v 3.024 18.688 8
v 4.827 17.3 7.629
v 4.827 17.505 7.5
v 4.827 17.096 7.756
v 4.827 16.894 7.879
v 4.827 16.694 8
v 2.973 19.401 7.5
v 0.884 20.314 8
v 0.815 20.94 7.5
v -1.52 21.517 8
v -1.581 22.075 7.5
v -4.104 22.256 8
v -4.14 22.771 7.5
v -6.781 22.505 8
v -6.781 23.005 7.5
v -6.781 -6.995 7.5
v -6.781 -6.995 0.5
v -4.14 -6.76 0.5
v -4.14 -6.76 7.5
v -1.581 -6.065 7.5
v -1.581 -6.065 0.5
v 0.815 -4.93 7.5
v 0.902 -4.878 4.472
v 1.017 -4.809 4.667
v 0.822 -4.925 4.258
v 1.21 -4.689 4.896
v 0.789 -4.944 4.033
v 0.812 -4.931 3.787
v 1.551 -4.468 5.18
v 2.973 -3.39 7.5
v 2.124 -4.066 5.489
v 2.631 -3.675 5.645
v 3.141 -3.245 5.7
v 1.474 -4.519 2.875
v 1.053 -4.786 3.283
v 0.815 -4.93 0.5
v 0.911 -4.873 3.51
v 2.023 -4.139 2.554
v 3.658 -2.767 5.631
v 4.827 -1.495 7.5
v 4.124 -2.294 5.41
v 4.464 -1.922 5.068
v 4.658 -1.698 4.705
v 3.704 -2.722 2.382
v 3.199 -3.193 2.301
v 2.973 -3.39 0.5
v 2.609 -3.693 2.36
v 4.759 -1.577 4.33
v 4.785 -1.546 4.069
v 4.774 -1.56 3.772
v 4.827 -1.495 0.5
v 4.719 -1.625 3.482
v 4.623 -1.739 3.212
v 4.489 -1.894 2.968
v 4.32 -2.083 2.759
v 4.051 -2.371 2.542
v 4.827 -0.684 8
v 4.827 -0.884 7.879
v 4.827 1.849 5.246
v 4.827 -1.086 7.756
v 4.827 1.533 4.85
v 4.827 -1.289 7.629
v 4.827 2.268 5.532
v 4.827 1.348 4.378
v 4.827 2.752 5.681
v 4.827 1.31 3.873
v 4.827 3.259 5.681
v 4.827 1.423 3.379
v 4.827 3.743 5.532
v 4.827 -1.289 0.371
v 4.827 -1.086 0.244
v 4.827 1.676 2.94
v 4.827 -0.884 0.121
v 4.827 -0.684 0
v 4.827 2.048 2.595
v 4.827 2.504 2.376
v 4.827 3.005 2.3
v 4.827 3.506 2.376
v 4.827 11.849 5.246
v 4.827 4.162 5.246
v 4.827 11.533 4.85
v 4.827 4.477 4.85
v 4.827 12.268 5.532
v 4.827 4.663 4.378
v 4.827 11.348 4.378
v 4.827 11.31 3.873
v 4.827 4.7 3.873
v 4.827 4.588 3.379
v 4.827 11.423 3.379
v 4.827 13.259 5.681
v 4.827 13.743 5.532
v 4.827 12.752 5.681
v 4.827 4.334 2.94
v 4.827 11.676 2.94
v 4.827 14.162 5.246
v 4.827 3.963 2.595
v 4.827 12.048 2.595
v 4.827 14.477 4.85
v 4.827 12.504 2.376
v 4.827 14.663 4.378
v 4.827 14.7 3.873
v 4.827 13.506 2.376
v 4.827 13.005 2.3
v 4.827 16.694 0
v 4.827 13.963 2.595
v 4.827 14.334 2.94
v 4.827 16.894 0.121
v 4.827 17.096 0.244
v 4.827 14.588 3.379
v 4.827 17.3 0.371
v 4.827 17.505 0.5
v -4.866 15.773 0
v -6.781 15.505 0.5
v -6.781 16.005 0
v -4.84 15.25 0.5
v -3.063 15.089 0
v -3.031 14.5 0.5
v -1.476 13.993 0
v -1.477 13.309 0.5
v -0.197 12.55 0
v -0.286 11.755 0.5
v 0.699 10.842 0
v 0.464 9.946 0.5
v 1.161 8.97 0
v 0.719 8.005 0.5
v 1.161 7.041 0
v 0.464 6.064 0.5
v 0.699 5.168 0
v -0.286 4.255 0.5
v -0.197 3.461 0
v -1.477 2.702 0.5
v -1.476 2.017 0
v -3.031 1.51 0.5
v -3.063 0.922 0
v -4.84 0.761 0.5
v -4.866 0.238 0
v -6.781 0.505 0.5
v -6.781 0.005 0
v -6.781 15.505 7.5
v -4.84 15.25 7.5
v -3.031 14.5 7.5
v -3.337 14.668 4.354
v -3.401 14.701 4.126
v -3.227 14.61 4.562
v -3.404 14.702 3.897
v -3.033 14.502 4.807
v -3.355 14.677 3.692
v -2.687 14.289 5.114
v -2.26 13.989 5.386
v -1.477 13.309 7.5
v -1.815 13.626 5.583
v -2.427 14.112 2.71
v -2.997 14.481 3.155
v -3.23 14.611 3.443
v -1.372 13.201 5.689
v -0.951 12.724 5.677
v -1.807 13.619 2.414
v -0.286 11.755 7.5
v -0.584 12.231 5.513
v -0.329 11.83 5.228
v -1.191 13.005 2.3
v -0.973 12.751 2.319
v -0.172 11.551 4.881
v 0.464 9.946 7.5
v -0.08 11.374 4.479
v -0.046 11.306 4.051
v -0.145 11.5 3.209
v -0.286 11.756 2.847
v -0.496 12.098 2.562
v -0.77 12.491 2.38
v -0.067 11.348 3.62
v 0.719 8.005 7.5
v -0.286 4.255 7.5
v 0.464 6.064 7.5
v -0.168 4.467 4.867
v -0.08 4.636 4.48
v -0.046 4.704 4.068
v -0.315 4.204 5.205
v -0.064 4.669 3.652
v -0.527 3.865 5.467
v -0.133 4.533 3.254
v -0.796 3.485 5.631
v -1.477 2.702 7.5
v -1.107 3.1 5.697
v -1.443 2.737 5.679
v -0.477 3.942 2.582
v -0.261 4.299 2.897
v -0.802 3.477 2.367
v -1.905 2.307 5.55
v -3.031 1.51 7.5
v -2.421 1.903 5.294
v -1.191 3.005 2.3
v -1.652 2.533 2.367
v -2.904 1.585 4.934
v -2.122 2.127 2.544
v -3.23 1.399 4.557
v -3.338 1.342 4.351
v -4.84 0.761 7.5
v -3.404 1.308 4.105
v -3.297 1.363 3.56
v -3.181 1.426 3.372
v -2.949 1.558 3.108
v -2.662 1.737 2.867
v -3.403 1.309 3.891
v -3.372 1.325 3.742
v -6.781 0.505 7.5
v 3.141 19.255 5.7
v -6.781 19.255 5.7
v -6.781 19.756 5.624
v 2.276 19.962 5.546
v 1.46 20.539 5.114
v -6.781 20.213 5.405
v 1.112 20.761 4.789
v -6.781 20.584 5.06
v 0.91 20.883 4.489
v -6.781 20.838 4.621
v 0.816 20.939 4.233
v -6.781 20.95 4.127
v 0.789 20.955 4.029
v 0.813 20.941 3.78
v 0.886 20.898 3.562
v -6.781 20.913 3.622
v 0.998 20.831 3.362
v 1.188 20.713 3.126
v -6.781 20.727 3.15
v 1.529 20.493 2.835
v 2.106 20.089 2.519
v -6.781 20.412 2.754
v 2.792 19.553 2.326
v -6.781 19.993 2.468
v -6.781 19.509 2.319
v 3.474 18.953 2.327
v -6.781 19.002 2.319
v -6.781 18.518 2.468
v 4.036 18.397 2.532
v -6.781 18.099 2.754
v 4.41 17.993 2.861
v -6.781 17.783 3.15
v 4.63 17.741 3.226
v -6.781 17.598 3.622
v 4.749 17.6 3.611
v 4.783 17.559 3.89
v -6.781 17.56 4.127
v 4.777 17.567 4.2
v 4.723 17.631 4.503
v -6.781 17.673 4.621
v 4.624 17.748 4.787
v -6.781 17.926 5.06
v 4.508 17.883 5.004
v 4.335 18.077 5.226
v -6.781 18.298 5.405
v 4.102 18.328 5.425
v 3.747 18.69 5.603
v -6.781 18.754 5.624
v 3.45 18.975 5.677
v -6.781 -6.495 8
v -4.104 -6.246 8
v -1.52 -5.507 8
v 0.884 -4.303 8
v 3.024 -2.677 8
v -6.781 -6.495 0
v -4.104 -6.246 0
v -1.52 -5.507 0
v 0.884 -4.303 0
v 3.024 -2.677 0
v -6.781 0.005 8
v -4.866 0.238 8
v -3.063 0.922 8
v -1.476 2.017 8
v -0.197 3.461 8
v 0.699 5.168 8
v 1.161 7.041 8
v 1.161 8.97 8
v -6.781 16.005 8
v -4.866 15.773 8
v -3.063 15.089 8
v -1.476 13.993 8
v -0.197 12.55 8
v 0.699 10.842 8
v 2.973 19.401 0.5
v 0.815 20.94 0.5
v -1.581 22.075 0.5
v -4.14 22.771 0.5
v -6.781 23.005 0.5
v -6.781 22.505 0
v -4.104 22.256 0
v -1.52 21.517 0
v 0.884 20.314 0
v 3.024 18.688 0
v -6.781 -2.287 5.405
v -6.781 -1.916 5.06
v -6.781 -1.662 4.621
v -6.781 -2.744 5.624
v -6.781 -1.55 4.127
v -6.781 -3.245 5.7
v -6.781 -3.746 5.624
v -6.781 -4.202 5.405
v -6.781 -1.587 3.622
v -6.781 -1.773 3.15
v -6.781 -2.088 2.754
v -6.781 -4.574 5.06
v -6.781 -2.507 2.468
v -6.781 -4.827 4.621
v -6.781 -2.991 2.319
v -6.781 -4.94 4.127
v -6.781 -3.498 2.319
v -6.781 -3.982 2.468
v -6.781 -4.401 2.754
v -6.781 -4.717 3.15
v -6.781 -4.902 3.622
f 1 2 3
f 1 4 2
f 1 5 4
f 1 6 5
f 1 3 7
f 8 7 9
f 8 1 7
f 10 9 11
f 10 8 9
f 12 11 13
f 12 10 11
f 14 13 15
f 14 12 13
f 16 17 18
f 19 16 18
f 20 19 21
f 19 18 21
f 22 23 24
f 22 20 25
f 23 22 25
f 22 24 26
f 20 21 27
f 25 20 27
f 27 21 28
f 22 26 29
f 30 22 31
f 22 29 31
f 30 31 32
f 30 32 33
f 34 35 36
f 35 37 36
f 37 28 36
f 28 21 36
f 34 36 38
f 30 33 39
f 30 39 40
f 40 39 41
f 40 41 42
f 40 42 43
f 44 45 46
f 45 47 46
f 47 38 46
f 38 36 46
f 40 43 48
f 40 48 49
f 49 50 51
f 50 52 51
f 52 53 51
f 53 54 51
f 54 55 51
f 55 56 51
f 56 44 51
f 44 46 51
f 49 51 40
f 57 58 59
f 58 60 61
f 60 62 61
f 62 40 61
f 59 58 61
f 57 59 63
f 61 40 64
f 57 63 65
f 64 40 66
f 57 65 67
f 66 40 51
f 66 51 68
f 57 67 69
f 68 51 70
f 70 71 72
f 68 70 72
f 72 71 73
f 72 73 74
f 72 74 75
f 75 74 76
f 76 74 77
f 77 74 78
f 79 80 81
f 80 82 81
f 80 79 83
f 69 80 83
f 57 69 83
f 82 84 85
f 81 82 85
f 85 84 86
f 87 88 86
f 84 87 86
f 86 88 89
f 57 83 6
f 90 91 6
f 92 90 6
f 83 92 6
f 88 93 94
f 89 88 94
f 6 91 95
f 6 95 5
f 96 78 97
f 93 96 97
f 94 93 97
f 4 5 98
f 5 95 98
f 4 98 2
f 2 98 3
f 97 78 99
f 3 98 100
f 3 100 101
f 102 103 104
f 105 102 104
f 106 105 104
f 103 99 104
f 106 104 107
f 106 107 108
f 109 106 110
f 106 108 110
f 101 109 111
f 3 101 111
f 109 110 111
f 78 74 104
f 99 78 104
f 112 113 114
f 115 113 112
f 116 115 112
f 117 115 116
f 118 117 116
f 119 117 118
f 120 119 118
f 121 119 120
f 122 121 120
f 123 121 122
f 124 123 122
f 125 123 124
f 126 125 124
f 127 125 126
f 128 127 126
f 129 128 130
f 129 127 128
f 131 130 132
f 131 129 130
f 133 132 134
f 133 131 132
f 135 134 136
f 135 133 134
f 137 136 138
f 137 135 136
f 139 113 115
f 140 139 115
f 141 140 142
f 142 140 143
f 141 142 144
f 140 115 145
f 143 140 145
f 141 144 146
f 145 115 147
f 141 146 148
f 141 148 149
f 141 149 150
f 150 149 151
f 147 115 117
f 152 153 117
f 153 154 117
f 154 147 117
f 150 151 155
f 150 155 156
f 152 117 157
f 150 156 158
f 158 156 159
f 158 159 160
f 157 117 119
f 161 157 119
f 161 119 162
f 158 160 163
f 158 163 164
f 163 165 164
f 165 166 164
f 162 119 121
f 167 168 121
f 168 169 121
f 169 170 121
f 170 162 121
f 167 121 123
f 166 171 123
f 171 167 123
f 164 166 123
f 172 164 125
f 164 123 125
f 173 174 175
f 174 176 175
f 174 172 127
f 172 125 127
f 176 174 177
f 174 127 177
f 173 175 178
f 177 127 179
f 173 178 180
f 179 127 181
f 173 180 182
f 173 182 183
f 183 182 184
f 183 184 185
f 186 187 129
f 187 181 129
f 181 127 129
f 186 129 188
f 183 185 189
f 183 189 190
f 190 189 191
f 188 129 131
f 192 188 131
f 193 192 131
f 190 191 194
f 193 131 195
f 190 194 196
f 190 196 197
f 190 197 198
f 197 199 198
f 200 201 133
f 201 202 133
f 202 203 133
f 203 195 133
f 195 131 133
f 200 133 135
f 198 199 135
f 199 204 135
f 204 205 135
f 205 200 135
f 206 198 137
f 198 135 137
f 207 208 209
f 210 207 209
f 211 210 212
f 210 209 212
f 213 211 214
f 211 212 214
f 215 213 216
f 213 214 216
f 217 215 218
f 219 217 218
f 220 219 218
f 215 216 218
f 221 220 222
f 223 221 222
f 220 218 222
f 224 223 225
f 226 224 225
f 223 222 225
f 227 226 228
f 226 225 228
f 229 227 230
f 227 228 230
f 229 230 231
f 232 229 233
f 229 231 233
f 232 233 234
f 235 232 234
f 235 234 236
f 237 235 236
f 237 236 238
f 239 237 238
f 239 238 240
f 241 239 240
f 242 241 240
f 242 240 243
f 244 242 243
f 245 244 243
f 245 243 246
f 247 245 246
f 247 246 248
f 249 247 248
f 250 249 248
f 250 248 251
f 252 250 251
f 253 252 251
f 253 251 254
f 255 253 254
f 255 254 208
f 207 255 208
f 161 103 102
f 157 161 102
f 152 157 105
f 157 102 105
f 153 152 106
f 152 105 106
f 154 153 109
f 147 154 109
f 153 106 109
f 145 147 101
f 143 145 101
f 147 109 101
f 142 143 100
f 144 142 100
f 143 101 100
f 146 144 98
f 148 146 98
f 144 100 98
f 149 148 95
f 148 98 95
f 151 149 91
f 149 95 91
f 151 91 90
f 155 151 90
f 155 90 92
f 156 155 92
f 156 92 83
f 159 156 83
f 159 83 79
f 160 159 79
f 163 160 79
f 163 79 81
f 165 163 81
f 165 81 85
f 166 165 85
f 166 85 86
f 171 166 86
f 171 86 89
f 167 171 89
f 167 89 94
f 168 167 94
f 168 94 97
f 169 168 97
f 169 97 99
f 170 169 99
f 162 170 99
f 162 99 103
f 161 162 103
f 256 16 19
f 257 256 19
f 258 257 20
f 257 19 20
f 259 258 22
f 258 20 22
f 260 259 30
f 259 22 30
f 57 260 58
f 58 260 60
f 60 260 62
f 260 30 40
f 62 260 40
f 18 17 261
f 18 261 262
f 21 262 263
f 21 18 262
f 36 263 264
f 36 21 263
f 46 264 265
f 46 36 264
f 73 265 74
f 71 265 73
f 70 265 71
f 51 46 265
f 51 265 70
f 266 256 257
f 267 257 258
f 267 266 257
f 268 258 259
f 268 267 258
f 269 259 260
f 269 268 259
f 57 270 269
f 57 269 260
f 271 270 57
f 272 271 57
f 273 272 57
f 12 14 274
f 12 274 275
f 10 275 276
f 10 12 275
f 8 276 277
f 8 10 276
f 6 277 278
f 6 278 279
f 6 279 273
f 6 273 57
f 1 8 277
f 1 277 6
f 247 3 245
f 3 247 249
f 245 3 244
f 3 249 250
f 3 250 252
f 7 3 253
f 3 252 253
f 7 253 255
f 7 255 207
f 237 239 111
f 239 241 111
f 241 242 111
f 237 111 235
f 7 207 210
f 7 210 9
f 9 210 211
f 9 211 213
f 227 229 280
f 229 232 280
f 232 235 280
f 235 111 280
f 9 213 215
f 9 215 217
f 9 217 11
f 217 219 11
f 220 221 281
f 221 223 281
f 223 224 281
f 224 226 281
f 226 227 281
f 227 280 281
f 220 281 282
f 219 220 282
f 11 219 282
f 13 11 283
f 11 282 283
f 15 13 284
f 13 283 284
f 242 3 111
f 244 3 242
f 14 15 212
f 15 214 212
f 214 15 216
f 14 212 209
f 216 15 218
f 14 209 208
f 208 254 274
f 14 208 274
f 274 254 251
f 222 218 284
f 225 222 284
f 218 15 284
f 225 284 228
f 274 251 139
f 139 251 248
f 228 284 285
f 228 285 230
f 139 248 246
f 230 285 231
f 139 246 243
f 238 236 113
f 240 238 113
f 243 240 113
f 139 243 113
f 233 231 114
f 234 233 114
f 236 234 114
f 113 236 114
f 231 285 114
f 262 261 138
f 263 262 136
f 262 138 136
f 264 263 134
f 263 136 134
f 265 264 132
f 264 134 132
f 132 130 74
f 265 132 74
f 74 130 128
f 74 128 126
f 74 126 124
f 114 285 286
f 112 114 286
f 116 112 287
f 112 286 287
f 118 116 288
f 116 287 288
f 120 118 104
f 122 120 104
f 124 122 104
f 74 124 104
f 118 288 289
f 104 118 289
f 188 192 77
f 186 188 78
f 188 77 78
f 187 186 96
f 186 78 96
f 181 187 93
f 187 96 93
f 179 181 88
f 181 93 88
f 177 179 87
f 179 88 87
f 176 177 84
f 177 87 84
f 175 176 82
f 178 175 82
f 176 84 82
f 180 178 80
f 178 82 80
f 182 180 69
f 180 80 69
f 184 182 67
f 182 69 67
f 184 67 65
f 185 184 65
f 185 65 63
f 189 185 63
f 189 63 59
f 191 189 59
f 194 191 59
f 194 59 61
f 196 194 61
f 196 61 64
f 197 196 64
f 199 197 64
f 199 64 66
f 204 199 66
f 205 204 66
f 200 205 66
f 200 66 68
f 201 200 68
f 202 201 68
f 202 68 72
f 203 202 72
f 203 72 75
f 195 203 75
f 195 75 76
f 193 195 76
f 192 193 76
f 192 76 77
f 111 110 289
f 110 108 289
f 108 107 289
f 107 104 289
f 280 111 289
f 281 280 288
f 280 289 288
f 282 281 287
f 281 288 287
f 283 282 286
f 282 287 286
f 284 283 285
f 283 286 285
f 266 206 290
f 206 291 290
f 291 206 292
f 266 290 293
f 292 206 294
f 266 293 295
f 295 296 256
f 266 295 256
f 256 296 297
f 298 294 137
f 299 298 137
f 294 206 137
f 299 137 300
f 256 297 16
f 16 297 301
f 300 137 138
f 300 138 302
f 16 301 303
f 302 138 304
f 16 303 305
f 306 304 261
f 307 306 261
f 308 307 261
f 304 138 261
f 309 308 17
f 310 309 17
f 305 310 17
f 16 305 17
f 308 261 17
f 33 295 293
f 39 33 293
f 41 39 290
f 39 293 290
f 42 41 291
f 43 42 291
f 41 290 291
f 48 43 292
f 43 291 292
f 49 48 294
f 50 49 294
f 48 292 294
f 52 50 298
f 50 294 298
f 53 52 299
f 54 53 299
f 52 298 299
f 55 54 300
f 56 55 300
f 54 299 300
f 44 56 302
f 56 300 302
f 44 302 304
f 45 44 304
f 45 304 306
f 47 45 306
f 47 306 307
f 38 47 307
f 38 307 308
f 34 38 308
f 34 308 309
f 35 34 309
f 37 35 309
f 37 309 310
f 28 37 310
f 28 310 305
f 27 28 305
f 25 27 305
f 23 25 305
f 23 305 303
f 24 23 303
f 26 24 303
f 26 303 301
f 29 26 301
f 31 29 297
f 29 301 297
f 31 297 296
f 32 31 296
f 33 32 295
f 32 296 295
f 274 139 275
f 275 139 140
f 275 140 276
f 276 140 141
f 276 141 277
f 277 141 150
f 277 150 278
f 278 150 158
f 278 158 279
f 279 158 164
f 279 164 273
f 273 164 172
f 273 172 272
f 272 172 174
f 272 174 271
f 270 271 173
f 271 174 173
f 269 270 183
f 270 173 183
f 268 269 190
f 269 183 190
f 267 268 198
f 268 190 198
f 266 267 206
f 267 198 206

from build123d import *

# Parameters (mm, degrees)
EXTRUDE_1_DEPTH     = 8
SKETCH_2_R          = 1.7
CUT_EXTRUDE_2_DEPTH = 15
SKETCH_3_R          = 1.7
CUT_EXTRUDE_4_DEPTH = 15
CHAMFER_1_SIZE      = 0.5
SKETCH_4_R          = 1.7
CUT_EXTRUDE_5_DEPTH = 10


with BuildPart() as part:
    # 草图1 → 凸台-拉伸1 (new body)
    with BuildSketch(Plane.XY):
        with BuildLine():
            Line((-6.780789716, 23.005235362), (-6.780789716, 15.505235362))
            ThreePointArc((-6.780789716, 15.505235362), (0.719210284, 8.005235362), (-6.780789716, 0.505235362))
            Line((-6.780789716, 0.505235362), (-6.780789716, -6.994764638))
            ThreePointArc((-6.780789716, -6.994764638), (-0.358173427, -5.55020635), (4.82739705, -1.494764638))
            Line((4.82739705, -1.494764638), (4.82739705, 17.505235362))
            ThreePointArc((4.82739705, 17.505235362), (-0.358173427, 21.560677073), (-6.780789716, 23.005235362))
        make_face()
    extrude(amount=EXTRUDE_1_DEPTH)

    # 草图2 → 切除-拉伸2 (cut)
    with BuildSketch(Plane.ZY.offset(6.780789716)):
        with Locations((4, 19.255235362)):
            Circle(SKETCH_2_R)
    extrude(amount=-CUT_EXTRUDE_2_DEPTH, mode=Mode.SUBTRACT)

    # 草图3 → 切除-拉伸4 (cut)
    with BuildSketch(Plane.ZY.offset(6.780789716)):
        with Locations((4, -3.244764638)):
            Circle(SKETCH_3_R)
    extrude(amount=-CUT_EXTRUDE_4_DEPTH, mode=Mode.SUBTRACT)

    # 倒角1
    chamfer_1_edges = [part.edges().sort_by_distance(p)[0] for p in [
        (-0.358173427, -5.55020635, 8),
        (-0.358173427, 21.560677073, 8),
        (0.719210284, 8.005235362, 8),
        (-0.358173427, 21.560677073, 0),
        (-0.358173427, -5.55020635, 0),
        (0.719210284, 8.005235362, 0),
    ]]
    chamfer(chamfer_1_edges, length=CHAMFER_1_SIZE)

    # 草图4 → 切除-拉伸5 (cut)
    with BuildSketch(Plane(origin=(4.82739705, 0, 0), x_dir=(0, 0, -1), z_dir=(1, 0, 0))):
        with Locations((-4, 13.005235362)):
            Circle(SKETCH_4_R)
        with Locations((-4, 3.005235362)):
            Circle(SKETCH_4_R)
    extrude(amount=-CUT_EXTRUDE_5_DEPTH, mode=Mode.SUBTRACT)


solid = part.part
